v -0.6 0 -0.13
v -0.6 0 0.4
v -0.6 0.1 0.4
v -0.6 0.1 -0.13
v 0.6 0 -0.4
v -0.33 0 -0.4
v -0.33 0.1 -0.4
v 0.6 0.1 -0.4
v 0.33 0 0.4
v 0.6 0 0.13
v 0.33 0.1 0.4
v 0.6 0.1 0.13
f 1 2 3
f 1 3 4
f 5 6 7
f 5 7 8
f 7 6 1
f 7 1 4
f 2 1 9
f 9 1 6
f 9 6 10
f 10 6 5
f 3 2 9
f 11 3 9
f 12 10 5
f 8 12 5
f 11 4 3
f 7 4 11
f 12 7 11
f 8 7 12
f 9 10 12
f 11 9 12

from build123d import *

# Parameters (mm, degrees)
ESBO_O1_W       = 1.2
ESBO_O1_H       = 0.8
EXTRUS_O1_DEPTH = 0.1
CHANFRO1_SIZE   = 0.27
CHANFRO2_SIZE   = 0.27


with BuildPart() as part:
    # Esboço1 → Extrusão1 (new body)
    with BuildSketch(Plane(origin=(0, 0, 0), x_dir=(1, 0, 0), z_dir=(0, 1, 0))):
        Rectangle(ESBO_O1_W, ESBO_O1_H)
    extrude(amount=EXTRUS_O1_DEPTH)

    # Chanfro1
    chanfro1_edges = [part.edges().sort_by_distance(p)[0] for p in [
        (0.6, 0.05, 0.4),
    ]]
    chamfer(chanfro1_edges, length=CHANFRO1_SIZE)

    # Chanfro2
    chanfro2_edges = [part.edges().sort_by_distance(p)[0] for p in [
        (-0.6, 0.05, -0.4),
    ]]
    chamfer(chanfro2_edges, length=CHANFRO2_SIZE)


solid = part.part
